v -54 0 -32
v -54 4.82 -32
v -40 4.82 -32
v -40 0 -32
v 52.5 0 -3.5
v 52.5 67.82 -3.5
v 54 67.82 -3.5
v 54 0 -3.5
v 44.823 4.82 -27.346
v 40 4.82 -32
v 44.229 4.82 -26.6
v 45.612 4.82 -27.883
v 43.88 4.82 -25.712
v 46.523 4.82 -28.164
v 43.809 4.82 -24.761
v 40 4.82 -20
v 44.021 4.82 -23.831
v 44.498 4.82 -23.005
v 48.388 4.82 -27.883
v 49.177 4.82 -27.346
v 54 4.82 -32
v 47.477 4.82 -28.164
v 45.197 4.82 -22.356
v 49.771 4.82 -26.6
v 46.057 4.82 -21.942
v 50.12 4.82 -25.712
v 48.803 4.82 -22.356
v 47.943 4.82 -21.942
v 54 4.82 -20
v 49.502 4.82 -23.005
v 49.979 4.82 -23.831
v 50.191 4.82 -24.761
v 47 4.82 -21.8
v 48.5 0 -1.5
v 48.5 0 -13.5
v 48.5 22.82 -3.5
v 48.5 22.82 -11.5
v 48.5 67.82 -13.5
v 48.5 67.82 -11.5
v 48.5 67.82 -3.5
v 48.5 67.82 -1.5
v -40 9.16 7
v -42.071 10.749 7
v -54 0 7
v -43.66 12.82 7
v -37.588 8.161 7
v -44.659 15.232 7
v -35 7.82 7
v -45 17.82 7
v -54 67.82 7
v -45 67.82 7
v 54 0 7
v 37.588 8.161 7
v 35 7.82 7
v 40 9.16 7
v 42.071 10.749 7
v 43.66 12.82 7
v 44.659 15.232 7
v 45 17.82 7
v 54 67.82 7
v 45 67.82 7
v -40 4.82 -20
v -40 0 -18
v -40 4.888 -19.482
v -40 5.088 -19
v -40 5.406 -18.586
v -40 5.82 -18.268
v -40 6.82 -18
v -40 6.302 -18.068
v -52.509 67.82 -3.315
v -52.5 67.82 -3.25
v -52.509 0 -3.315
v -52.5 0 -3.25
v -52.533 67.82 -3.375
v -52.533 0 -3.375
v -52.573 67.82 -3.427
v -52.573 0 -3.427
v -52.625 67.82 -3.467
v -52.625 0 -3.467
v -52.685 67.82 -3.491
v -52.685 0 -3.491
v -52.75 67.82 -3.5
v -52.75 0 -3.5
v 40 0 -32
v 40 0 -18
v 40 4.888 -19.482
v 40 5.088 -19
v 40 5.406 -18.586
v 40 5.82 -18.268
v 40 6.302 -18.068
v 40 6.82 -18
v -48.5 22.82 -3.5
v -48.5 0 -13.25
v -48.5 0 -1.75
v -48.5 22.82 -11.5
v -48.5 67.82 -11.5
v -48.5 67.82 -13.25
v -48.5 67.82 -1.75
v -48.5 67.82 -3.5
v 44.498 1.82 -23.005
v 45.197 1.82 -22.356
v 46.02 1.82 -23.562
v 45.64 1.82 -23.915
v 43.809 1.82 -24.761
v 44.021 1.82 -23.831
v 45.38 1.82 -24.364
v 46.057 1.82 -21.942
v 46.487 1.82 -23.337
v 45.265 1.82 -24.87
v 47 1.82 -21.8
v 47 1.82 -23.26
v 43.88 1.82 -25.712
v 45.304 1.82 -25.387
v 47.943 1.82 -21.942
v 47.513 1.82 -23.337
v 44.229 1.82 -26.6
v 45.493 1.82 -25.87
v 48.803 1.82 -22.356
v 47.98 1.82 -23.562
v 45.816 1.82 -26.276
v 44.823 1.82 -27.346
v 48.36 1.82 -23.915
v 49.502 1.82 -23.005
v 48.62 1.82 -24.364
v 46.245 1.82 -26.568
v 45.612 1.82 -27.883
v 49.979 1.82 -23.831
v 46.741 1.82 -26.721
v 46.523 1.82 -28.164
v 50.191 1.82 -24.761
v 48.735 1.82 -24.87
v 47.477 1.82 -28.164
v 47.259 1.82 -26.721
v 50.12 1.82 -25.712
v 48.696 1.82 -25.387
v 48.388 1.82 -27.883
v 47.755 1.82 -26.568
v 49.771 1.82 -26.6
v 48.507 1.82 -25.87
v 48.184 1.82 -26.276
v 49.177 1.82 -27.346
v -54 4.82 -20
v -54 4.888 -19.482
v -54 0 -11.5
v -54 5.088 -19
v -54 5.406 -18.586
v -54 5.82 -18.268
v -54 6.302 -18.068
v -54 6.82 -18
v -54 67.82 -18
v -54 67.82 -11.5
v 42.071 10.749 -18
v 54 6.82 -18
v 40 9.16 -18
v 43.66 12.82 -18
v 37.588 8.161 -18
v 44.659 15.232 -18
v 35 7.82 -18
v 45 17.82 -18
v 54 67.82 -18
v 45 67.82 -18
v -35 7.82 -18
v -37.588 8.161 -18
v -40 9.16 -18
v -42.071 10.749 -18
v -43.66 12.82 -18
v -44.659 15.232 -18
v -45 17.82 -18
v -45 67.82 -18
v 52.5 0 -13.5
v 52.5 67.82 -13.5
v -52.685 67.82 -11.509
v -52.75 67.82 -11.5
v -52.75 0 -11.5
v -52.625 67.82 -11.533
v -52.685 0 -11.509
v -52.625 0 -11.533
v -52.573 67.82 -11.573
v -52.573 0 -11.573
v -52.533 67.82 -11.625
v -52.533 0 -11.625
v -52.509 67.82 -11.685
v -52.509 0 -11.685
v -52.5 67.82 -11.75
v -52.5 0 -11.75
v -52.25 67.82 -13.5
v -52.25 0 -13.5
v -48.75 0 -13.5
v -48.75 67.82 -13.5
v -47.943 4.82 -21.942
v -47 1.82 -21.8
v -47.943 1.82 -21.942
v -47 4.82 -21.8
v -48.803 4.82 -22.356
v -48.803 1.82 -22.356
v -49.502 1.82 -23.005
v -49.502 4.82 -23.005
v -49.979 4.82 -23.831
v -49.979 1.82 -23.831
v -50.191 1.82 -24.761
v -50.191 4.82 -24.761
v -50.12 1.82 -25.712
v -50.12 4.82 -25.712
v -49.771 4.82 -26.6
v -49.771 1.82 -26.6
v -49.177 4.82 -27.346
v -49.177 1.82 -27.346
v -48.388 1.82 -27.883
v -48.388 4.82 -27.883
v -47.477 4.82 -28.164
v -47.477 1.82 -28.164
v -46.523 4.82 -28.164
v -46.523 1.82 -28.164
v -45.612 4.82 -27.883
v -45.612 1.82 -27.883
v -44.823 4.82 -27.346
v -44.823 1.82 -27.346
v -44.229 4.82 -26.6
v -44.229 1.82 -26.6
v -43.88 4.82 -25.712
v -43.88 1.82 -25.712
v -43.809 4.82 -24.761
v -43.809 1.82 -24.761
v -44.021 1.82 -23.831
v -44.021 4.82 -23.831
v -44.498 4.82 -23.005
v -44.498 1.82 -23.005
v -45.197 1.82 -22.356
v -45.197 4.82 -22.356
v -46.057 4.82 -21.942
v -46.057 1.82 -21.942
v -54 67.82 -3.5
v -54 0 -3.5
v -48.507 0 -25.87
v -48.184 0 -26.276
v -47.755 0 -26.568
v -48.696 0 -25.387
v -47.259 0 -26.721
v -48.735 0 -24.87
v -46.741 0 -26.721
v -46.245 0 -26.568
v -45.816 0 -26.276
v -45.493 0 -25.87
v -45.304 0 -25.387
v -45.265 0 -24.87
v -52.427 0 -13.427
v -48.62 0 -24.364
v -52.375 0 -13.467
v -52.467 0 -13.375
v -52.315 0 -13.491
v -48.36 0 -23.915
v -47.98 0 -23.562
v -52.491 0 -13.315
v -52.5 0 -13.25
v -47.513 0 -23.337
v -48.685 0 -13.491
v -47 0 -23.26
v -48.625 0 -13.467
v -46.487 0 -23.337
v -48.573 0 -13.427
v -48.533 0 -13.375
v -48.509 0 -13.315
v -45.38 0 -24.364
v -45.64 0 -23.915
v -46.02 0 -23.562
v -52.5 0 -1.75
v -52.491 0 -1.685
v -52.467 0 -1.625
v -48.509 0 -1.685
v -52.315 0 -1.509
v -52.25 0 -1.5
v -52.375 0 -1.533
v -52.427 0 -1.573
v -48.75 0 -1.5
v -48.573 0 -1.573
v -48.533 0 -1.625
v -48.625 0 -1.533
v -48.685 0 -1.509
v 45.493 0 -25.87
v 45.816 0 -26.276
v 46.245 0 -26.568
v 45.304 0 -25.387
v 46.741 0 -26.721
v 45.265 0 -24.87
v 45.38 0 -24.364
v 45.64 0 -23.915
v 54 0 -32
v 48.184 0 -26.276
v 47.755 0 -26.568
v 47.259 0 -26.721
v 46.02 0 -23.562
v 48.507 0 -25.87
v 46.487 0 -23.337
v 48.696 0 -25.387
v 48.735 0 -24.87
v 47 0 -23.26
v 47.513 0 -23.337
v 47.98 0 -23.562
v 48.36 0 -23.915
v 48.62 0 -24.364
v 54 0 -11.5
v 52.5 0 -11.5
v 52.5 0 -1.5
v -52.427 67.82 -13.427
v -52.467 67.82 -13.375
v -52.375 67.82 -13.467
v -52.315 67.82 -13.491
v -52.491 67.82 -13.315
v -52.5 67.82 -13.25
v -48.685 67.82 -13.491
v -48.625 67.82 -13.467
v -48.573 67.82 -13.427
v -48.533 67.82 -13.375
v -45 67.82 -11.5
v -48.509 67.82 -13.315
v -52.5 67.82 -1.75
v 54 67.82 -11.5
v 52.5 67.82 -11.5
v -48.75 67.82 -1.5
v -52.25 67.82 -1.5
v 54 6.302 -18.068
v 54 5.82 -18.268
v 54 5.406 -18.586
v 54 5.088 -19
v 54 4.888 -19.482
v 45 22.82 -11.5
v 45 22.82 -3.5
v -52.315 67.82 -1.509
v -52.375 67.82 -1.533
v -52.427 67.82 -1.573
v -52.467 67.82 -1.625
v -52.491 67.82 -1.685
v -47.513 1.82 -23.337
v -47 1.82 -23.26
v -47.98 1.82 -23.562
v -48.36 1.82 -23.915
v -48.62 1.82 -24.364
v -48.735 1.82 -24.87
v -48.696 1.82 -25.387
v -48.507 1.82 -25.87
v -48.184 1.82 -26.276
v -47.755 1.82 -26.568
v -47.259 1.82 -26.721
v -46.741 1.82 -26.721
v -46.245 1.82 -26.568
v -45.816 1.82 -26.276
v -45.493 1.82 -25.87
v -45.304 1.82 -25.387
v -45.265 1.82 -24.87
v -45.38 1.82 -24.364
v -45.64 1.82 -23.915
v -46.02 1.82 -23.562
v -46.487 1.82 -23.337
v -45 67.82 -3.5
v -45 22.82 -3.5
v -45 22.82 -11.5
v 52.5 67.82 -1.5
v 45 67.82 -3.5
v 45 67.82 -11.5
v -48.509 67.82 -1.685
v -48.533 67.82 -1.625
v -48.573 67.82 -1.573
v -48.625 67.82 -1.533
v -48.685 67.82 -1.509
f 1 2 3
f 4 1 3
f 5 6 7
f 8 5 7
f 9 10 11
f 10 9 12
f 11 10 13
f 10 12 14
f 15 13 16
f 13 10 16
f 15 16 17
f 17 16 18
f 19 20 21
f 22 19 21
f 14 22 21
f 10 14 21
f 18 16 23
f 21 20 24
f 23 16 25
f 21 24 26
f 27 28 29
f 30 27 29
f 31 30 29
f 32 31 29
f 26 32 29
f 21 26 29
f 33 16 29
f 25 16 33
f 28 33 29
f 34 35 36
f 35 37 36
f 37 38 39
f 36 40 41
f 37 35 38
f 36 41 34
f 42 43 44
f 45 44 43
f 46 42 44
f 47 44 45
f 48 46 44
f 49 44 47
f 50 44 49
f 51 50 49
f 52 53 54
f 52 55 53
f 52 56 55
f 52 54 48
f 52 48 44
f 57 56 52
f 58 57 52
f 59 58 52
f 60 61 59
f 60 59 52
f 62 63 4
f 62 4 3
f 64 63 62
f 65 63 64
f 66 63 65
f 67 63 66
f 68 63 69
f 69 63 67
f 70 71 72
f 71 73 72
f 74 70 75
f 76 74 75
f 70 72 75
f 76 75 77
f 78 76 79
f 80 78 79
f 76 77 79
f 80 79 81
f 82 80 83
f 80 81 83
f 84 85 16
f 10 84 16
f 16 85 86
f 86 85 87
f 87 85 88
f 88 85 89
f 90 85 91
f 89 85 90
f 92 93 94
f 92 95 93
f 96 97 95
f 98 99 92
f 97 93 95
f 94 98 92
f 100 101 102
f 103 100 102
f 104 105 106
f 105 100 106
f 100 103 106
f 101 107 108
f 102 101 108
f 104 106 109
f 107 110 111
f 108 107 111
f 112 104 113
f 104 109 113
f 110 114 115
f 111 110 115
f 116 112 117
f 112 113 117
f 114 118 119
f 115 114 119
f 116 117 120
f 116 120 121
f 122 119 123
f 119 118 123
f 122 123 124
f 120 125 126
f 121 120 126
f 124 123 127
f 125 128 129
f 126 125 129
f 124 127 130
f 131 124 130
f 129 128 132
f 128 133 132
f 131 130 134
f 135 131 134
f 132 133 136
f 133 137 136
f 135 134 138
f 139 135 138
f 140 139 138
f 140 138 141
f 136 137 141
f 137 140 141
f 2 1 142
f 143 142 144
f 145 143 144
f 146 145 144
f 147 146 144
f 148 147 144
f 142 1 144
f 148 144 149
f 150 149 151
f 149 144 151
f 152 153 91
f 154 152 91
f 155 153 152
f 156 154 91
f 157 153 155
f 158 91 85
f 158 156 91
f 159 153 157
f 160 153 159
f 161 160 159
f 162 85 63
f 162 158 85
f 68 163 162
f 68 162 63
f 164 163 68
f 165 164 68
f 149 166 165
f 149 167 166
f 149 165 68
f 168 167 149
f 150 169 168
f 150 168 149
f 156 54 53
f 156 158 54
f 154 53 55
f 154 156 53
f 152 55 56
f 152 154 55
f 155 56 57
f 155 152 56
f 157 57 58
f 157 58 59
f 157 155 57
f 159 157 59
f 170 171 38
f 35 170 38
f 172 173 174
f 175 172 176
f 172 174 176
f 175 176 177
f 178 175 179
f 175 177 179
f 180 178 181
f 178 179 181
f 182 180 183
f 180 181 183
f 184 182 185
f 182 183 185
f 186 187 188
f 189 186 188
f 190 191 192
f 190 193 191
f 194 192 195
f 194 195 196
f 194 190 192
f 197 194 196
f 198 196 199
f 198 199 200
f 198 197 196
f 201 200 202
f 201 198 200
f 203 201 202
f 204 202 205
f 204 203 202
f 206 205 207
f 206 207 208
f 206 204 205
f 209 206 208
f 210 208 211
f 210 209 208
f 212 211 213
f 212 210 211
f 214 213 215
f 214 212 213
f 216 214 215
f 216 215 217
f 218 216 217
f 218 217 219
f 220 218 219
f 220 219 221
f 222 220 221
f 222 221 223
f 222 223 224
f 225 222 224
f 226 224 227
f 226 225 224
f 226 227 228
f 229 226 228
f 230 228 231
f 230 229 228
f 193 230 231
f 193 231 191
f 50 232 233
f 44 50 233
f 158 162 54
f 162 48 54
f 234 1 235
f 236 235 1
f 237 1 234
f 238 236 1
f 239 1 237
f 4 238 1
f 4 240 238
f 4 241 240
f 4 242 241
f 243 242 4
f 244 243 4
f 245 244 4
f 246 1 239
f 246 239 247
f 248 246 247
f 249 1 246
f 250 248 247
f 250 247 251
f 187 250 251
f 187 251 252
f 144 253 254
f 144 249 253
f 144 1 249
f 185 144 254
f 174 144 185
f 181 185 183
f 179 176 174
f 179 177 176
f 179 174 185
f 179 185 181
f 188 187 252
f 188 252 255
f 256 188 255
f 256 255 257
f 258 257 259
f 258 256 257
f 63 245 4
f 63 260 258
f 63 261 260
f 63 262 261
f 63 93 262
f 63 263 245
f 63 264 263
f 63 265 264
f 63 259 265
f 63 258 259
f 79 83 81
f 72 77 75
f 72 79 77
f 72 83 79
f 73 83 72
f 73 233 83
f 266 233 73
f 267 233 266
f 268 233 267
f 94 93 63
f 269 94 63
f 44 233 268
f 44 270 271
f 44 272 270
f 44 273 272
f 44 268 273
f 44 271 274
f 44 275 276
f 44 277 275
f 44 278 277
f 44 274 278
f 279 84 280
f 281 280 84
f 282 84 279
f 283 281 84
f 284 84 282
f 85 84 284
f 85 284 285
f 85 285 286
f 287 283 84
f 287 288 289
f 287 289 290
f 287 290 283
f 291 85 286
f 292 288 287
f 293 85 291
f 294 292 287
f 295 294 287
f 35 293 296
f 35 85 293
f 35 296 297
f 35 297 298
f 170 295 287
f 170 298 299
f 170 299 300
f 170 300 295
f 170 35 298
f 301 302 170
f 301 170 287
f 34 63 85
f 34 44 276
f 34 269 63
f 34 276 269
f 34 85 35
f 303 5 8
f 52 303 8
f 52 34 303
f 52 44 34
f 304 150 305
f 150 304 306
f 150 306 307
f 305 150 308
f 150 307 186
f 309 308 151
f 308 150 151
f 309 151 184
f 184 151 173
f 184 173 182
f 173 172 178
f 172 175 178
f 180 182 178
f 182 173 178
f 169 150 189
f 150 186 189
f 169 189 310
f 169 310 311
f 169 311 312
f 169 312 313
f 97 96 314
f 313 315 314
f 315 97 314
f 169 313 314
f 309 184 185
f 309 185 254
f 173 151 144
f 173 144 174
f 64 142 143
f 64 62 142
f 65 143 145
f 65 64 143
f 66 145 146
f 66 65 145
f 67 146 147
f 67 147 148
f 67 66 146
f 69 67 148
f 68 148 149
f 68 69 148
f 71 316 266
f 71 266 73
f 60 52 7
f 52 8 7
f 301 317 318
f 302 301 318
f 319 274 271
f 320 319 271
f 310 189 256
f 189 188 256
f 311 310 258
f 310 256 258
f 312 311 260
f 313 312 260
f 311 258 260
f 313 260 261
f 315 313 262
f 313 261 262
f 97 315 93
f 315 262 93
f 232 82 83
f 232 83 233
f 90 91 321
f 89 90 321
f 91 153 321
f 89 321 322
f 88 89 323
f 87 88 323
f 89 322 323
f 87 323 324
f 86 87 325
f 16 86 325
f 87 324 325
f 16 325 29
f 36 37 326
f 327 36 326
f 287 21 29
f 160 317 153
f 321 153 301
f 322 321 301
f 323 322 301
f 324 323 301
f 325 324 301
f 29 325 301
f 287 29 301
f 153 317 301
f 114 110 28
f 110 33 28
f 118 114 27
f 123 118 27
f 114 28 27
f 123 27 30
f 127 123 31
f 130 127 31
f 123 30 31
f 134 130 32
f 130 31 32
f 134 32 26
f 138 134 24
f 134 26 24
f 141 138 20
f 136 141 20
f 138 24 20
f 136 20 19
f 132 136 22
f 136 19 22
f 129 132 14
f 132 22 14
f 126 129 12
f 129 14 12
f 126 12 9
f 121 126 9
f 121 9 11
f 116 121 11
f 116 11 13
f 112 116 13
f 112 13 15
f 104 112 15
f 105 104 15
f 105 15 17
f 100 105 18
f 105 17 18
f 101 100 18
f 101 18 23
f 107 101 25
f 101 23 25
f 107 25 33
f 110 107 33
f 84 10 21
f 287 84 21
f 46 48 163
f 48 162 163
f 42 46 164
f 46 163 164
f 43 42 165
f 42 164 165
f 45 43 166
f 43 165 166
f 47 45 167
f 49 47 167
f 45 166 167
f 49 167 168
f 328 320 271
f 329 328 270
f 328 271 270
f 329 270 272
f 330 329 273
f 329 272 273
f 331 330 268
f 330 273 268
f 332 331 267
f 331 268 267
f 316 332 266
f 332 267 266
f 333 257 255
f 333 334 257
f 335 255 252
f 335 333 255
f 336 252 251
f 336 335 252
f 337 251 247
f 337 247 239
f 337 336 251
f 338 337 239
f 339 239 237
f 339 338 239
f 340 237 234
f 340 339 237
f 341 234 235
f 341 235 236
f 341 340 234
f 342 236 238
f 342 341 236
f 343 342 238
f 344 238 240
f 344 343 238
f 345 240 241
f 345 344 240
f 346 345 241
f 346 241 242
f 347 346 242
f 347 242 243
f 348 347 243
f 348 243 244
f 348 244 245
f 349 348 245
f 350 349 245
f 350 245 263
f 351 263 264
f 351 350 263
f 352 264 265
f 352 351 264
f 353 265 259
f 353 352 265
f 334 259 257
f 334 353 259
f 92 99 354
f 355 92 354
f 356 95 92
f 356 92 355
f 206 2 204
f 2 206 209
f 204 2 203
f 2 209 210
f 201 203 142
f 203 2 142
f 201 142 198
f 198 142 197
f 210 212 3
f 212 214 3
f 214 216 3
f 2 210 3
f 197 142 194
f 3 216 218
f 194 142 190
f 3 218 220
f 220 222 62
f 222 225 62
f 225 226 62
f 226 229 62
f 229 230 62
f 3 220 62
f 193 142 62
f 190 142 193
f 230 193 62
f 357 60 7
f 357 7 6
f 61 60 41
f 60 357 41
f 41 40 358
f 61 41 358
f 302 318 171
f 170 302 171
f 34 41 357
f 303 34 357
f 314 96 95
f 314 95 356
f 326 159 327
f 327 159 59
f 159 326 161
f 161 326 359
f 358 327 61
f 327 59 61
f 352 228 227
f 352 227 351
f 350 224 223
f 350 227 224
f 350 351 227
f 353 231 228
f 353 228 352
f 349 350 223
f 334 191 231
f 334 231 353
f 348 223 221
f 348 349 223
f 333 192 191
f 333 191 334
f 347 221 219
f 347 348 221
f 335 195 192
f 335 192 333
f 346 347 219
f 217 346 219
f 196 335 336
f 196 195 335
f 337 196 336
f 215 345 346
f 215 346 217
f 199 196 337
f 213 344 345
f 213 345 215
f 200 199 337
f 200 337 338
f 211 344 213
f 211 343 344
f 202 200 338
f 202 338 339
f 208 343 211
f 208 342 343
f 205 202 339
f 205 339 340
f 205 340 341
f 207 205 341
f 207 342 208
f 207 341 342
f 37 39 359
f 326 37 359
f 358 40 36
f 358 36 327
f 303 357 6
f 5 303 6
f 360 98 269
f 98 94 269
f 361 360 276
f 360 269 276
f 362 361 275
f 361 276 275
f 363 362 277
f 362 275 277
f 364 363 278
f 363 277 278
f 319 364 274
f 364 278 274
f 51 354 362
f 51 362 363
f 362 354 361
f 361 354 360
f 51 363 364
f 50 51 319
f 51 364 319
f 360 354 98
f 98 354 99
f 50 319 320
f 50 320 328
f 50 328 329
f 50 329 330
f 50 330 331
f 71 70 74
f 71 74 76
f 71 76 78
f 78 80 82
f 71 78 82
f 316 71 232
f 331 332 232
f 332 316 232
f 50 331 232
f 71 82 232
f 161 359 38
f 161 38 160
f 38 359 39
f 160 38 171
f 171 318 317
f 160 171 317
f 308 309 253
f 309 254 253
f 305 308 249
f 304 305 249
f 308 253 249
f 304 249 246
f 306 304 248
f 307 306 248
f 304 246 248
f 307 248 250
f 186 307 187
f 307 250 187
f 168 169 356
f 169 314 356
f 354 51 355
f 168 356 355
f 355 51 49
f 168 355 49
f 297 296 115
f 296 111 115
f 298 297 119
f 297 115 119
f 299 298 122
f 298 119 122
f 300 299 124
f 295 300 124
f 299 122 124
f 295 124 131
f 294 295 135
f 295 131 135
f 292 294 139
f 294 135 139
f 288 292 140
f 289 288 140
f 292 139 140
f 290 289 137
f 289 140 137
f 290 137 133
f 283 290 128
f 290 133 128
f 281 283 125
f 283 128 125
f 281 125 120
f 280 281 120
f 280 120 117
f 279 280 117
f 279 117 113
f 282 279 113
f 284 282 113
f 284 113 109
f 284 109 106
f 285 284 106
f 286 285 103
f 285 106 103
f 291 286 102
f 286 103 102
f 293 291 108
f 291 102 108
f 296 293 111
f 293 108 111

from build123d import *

# Parameters (mm, degrees)
BOSS_EXTRUDE1_DEPTH = 15
CUT_EXTRUDE1_DEPTH  = 67.82
SKETCH3_W           = 3.5
SKETCH3_H           = 8
CUT_EXTRUDE2_DEPTH  = 45
FILLET1_R           = 0.25
BOSS_EXTRUDE2_DEPTH = 7
BOSS_EXTRUDE3_DEPTH = 3
FILLET2_R           = 10
SKETCH12_W          = 14
SKETCH12_H          = 4.82
BOSS_EXTRUDE4_DEPTH = 14
FILLET3_R           = 2


with BuildPart() as part:
    # Sketch1 → Boss-Extrude1 (new body)
    with BuildSketch(Plane.XY):
        Polygon((-54, 0), (54, 0), (54, 67.82), (45, 67.82), (45, 7.82), (-45, 7.82), (-45, 67.82), (-54, 67.82), align=None)
    extrude(amount=-BOSS_EXTRUDE1_DEPTH)

    # Sketch2 → Cut-Extrude1 (cut)
    with BuildSketch(Plane(origin=(0, 67.82, 0), x_dir=(1, 0, 0), z_dir=(0, 1, 0))):
        Polygon((-54, 11.5), (-52.5, 11.5), (-52.5, 13.5), (-48.5, 13.5), (-48.5, 1.5), (-52.5, 1.5), (-52.5, 3.5), (-54, 3.5), align=None)
    cut_extrude1 = extrude(amount=-CUT_EXTRUDE1_DEPTH, mode=Mode.SUBTRACT)

    # Sketch3 → Cut-Extrude2 (cut)
    with BuildSketch(Plane(origin=(0, 67.82, 0), x_dir=(1, 0, 0), z_dir=(0, 1, 0))):
        with Locations((-46.75, 7.5)):
            Rectangle(SKETCH3_W, SKETCH3_H)
    cut_extrude2 = extrude(amount=-CUT_EXTRUDE2_DEPTH, mode=Mode.SUBTRACT)

    # Fillet1
    fillet1_edges = [part.edges().sort_by_distance(p)[0] for p in [
        (-52.5, 33.91, -3.5),
        (-52.5, 33.91, -1.5),
        (-48.5, 33.91, -1.5),
        (-48.5, 33.91, -13.5),
        (-52.5, 33.91, -13.5),
        (-52.5, 33.91, -11.5),
    ]]
    fillet(fillet1_edges, radius=FILLET1_R)

    # Mirror1: Cut-Extrude1 across plane
    add(cut_extrude1.mirror(Plane(origin=(0, 0, 0), x_dir=(0, 0, 1), z_dir=(1, 0, 0))), mode=Mode.SUBTRACT)

    # Mirror2: Cut-Extrude2 across plane
    add(cut_extrude2.mirror(Plane(origin=(0, 0, 0), x_dir=(0, 0, 1), z_dir=(1, 0, 0))), mode=Mode.SUBTRACT)

    # Sketch7 → Boss-Extrude2 (add)
    with BuildSketch(Plane.XY):
        Polygon((-54, 67.82), (-54, 0), (54, 0), (54, 67.82), (45, 67.82), (45, 7.82), (-45, 7.82), (-45, 67.82), align=None)
    extrude(amount=BOSS_EXTRUDE2_DEPTH)

    # Sketch11 → Boss-Extrude3 (add)
    with BuildSketch(Plane(origin=(0, 0, -15), x_dir=(-1, 0, 0), z_dir=(0, 0, -1))):
        Polygon((54, 0), (54, 67.82), (45, 67.82), (45, 7.82), (-45, 7.82), (-45, 67.82), (-54, 67.82), (-54, 0), align=None)
    extrude(amount=BOSS_EXTRUDE3_DEPTH)

    # Fillet2
    fillet2_edges = [part.edges().sort_by_distance(p)[0] for p in [
        (-45, 7.82, -5.5),
        (45, 7.82, -5.5),
    ]]
    fillet(fillet2_edges, radius=FILLET2_R)

    # Sketch12 → Boss-Extrude4 (add)
    with BuildSketch(Plane.XY.offset(-18)):
        with Locations((-47, 2.41)):
            Rectangle(SKETCH12_W, SKETCH12_H)
        with Locations((47, 2.41)):
            Rectangle(SKETCH12_W, SKETCH12_H)
    extrude(amount=-BOSS_EXTRUDE4_DEPTH)

    # Sketch13 → Cut-Revolve1 (revolve, cut)
    with BuildSketch(Plane.ZY.offset(47)):
        Polygon((-25, 4.82), (-25, 0), (-23.26, 0), (-23.26, 1.82), (-21.8, 1.82), (-21.8, 4.82), align=None)
    cut_revolve1 = revolve(axis=Axis((-47, 4.82, -25), (0, -1, 0)), mode=Mode.SUBTRACT)

    # Mirror3: Cut-Revolve1 across plane
    add(cut_revolve1.mirror(Plane(origin=(0, 0, 0), x_dir=(0, 0, 1), z_dir=(1, 0, 0))), mode=Mode.SUBTRACT)

    # Fillet3
    fillet3_edges = [part.edges().sort_by_distance(p)[0] for p in [
        (-47, 4.82, -18),
        (47, 4.82, -18),
    ]]
    fillet(fillet3_edges, radius=FILLET3_R)


solid = part.part
